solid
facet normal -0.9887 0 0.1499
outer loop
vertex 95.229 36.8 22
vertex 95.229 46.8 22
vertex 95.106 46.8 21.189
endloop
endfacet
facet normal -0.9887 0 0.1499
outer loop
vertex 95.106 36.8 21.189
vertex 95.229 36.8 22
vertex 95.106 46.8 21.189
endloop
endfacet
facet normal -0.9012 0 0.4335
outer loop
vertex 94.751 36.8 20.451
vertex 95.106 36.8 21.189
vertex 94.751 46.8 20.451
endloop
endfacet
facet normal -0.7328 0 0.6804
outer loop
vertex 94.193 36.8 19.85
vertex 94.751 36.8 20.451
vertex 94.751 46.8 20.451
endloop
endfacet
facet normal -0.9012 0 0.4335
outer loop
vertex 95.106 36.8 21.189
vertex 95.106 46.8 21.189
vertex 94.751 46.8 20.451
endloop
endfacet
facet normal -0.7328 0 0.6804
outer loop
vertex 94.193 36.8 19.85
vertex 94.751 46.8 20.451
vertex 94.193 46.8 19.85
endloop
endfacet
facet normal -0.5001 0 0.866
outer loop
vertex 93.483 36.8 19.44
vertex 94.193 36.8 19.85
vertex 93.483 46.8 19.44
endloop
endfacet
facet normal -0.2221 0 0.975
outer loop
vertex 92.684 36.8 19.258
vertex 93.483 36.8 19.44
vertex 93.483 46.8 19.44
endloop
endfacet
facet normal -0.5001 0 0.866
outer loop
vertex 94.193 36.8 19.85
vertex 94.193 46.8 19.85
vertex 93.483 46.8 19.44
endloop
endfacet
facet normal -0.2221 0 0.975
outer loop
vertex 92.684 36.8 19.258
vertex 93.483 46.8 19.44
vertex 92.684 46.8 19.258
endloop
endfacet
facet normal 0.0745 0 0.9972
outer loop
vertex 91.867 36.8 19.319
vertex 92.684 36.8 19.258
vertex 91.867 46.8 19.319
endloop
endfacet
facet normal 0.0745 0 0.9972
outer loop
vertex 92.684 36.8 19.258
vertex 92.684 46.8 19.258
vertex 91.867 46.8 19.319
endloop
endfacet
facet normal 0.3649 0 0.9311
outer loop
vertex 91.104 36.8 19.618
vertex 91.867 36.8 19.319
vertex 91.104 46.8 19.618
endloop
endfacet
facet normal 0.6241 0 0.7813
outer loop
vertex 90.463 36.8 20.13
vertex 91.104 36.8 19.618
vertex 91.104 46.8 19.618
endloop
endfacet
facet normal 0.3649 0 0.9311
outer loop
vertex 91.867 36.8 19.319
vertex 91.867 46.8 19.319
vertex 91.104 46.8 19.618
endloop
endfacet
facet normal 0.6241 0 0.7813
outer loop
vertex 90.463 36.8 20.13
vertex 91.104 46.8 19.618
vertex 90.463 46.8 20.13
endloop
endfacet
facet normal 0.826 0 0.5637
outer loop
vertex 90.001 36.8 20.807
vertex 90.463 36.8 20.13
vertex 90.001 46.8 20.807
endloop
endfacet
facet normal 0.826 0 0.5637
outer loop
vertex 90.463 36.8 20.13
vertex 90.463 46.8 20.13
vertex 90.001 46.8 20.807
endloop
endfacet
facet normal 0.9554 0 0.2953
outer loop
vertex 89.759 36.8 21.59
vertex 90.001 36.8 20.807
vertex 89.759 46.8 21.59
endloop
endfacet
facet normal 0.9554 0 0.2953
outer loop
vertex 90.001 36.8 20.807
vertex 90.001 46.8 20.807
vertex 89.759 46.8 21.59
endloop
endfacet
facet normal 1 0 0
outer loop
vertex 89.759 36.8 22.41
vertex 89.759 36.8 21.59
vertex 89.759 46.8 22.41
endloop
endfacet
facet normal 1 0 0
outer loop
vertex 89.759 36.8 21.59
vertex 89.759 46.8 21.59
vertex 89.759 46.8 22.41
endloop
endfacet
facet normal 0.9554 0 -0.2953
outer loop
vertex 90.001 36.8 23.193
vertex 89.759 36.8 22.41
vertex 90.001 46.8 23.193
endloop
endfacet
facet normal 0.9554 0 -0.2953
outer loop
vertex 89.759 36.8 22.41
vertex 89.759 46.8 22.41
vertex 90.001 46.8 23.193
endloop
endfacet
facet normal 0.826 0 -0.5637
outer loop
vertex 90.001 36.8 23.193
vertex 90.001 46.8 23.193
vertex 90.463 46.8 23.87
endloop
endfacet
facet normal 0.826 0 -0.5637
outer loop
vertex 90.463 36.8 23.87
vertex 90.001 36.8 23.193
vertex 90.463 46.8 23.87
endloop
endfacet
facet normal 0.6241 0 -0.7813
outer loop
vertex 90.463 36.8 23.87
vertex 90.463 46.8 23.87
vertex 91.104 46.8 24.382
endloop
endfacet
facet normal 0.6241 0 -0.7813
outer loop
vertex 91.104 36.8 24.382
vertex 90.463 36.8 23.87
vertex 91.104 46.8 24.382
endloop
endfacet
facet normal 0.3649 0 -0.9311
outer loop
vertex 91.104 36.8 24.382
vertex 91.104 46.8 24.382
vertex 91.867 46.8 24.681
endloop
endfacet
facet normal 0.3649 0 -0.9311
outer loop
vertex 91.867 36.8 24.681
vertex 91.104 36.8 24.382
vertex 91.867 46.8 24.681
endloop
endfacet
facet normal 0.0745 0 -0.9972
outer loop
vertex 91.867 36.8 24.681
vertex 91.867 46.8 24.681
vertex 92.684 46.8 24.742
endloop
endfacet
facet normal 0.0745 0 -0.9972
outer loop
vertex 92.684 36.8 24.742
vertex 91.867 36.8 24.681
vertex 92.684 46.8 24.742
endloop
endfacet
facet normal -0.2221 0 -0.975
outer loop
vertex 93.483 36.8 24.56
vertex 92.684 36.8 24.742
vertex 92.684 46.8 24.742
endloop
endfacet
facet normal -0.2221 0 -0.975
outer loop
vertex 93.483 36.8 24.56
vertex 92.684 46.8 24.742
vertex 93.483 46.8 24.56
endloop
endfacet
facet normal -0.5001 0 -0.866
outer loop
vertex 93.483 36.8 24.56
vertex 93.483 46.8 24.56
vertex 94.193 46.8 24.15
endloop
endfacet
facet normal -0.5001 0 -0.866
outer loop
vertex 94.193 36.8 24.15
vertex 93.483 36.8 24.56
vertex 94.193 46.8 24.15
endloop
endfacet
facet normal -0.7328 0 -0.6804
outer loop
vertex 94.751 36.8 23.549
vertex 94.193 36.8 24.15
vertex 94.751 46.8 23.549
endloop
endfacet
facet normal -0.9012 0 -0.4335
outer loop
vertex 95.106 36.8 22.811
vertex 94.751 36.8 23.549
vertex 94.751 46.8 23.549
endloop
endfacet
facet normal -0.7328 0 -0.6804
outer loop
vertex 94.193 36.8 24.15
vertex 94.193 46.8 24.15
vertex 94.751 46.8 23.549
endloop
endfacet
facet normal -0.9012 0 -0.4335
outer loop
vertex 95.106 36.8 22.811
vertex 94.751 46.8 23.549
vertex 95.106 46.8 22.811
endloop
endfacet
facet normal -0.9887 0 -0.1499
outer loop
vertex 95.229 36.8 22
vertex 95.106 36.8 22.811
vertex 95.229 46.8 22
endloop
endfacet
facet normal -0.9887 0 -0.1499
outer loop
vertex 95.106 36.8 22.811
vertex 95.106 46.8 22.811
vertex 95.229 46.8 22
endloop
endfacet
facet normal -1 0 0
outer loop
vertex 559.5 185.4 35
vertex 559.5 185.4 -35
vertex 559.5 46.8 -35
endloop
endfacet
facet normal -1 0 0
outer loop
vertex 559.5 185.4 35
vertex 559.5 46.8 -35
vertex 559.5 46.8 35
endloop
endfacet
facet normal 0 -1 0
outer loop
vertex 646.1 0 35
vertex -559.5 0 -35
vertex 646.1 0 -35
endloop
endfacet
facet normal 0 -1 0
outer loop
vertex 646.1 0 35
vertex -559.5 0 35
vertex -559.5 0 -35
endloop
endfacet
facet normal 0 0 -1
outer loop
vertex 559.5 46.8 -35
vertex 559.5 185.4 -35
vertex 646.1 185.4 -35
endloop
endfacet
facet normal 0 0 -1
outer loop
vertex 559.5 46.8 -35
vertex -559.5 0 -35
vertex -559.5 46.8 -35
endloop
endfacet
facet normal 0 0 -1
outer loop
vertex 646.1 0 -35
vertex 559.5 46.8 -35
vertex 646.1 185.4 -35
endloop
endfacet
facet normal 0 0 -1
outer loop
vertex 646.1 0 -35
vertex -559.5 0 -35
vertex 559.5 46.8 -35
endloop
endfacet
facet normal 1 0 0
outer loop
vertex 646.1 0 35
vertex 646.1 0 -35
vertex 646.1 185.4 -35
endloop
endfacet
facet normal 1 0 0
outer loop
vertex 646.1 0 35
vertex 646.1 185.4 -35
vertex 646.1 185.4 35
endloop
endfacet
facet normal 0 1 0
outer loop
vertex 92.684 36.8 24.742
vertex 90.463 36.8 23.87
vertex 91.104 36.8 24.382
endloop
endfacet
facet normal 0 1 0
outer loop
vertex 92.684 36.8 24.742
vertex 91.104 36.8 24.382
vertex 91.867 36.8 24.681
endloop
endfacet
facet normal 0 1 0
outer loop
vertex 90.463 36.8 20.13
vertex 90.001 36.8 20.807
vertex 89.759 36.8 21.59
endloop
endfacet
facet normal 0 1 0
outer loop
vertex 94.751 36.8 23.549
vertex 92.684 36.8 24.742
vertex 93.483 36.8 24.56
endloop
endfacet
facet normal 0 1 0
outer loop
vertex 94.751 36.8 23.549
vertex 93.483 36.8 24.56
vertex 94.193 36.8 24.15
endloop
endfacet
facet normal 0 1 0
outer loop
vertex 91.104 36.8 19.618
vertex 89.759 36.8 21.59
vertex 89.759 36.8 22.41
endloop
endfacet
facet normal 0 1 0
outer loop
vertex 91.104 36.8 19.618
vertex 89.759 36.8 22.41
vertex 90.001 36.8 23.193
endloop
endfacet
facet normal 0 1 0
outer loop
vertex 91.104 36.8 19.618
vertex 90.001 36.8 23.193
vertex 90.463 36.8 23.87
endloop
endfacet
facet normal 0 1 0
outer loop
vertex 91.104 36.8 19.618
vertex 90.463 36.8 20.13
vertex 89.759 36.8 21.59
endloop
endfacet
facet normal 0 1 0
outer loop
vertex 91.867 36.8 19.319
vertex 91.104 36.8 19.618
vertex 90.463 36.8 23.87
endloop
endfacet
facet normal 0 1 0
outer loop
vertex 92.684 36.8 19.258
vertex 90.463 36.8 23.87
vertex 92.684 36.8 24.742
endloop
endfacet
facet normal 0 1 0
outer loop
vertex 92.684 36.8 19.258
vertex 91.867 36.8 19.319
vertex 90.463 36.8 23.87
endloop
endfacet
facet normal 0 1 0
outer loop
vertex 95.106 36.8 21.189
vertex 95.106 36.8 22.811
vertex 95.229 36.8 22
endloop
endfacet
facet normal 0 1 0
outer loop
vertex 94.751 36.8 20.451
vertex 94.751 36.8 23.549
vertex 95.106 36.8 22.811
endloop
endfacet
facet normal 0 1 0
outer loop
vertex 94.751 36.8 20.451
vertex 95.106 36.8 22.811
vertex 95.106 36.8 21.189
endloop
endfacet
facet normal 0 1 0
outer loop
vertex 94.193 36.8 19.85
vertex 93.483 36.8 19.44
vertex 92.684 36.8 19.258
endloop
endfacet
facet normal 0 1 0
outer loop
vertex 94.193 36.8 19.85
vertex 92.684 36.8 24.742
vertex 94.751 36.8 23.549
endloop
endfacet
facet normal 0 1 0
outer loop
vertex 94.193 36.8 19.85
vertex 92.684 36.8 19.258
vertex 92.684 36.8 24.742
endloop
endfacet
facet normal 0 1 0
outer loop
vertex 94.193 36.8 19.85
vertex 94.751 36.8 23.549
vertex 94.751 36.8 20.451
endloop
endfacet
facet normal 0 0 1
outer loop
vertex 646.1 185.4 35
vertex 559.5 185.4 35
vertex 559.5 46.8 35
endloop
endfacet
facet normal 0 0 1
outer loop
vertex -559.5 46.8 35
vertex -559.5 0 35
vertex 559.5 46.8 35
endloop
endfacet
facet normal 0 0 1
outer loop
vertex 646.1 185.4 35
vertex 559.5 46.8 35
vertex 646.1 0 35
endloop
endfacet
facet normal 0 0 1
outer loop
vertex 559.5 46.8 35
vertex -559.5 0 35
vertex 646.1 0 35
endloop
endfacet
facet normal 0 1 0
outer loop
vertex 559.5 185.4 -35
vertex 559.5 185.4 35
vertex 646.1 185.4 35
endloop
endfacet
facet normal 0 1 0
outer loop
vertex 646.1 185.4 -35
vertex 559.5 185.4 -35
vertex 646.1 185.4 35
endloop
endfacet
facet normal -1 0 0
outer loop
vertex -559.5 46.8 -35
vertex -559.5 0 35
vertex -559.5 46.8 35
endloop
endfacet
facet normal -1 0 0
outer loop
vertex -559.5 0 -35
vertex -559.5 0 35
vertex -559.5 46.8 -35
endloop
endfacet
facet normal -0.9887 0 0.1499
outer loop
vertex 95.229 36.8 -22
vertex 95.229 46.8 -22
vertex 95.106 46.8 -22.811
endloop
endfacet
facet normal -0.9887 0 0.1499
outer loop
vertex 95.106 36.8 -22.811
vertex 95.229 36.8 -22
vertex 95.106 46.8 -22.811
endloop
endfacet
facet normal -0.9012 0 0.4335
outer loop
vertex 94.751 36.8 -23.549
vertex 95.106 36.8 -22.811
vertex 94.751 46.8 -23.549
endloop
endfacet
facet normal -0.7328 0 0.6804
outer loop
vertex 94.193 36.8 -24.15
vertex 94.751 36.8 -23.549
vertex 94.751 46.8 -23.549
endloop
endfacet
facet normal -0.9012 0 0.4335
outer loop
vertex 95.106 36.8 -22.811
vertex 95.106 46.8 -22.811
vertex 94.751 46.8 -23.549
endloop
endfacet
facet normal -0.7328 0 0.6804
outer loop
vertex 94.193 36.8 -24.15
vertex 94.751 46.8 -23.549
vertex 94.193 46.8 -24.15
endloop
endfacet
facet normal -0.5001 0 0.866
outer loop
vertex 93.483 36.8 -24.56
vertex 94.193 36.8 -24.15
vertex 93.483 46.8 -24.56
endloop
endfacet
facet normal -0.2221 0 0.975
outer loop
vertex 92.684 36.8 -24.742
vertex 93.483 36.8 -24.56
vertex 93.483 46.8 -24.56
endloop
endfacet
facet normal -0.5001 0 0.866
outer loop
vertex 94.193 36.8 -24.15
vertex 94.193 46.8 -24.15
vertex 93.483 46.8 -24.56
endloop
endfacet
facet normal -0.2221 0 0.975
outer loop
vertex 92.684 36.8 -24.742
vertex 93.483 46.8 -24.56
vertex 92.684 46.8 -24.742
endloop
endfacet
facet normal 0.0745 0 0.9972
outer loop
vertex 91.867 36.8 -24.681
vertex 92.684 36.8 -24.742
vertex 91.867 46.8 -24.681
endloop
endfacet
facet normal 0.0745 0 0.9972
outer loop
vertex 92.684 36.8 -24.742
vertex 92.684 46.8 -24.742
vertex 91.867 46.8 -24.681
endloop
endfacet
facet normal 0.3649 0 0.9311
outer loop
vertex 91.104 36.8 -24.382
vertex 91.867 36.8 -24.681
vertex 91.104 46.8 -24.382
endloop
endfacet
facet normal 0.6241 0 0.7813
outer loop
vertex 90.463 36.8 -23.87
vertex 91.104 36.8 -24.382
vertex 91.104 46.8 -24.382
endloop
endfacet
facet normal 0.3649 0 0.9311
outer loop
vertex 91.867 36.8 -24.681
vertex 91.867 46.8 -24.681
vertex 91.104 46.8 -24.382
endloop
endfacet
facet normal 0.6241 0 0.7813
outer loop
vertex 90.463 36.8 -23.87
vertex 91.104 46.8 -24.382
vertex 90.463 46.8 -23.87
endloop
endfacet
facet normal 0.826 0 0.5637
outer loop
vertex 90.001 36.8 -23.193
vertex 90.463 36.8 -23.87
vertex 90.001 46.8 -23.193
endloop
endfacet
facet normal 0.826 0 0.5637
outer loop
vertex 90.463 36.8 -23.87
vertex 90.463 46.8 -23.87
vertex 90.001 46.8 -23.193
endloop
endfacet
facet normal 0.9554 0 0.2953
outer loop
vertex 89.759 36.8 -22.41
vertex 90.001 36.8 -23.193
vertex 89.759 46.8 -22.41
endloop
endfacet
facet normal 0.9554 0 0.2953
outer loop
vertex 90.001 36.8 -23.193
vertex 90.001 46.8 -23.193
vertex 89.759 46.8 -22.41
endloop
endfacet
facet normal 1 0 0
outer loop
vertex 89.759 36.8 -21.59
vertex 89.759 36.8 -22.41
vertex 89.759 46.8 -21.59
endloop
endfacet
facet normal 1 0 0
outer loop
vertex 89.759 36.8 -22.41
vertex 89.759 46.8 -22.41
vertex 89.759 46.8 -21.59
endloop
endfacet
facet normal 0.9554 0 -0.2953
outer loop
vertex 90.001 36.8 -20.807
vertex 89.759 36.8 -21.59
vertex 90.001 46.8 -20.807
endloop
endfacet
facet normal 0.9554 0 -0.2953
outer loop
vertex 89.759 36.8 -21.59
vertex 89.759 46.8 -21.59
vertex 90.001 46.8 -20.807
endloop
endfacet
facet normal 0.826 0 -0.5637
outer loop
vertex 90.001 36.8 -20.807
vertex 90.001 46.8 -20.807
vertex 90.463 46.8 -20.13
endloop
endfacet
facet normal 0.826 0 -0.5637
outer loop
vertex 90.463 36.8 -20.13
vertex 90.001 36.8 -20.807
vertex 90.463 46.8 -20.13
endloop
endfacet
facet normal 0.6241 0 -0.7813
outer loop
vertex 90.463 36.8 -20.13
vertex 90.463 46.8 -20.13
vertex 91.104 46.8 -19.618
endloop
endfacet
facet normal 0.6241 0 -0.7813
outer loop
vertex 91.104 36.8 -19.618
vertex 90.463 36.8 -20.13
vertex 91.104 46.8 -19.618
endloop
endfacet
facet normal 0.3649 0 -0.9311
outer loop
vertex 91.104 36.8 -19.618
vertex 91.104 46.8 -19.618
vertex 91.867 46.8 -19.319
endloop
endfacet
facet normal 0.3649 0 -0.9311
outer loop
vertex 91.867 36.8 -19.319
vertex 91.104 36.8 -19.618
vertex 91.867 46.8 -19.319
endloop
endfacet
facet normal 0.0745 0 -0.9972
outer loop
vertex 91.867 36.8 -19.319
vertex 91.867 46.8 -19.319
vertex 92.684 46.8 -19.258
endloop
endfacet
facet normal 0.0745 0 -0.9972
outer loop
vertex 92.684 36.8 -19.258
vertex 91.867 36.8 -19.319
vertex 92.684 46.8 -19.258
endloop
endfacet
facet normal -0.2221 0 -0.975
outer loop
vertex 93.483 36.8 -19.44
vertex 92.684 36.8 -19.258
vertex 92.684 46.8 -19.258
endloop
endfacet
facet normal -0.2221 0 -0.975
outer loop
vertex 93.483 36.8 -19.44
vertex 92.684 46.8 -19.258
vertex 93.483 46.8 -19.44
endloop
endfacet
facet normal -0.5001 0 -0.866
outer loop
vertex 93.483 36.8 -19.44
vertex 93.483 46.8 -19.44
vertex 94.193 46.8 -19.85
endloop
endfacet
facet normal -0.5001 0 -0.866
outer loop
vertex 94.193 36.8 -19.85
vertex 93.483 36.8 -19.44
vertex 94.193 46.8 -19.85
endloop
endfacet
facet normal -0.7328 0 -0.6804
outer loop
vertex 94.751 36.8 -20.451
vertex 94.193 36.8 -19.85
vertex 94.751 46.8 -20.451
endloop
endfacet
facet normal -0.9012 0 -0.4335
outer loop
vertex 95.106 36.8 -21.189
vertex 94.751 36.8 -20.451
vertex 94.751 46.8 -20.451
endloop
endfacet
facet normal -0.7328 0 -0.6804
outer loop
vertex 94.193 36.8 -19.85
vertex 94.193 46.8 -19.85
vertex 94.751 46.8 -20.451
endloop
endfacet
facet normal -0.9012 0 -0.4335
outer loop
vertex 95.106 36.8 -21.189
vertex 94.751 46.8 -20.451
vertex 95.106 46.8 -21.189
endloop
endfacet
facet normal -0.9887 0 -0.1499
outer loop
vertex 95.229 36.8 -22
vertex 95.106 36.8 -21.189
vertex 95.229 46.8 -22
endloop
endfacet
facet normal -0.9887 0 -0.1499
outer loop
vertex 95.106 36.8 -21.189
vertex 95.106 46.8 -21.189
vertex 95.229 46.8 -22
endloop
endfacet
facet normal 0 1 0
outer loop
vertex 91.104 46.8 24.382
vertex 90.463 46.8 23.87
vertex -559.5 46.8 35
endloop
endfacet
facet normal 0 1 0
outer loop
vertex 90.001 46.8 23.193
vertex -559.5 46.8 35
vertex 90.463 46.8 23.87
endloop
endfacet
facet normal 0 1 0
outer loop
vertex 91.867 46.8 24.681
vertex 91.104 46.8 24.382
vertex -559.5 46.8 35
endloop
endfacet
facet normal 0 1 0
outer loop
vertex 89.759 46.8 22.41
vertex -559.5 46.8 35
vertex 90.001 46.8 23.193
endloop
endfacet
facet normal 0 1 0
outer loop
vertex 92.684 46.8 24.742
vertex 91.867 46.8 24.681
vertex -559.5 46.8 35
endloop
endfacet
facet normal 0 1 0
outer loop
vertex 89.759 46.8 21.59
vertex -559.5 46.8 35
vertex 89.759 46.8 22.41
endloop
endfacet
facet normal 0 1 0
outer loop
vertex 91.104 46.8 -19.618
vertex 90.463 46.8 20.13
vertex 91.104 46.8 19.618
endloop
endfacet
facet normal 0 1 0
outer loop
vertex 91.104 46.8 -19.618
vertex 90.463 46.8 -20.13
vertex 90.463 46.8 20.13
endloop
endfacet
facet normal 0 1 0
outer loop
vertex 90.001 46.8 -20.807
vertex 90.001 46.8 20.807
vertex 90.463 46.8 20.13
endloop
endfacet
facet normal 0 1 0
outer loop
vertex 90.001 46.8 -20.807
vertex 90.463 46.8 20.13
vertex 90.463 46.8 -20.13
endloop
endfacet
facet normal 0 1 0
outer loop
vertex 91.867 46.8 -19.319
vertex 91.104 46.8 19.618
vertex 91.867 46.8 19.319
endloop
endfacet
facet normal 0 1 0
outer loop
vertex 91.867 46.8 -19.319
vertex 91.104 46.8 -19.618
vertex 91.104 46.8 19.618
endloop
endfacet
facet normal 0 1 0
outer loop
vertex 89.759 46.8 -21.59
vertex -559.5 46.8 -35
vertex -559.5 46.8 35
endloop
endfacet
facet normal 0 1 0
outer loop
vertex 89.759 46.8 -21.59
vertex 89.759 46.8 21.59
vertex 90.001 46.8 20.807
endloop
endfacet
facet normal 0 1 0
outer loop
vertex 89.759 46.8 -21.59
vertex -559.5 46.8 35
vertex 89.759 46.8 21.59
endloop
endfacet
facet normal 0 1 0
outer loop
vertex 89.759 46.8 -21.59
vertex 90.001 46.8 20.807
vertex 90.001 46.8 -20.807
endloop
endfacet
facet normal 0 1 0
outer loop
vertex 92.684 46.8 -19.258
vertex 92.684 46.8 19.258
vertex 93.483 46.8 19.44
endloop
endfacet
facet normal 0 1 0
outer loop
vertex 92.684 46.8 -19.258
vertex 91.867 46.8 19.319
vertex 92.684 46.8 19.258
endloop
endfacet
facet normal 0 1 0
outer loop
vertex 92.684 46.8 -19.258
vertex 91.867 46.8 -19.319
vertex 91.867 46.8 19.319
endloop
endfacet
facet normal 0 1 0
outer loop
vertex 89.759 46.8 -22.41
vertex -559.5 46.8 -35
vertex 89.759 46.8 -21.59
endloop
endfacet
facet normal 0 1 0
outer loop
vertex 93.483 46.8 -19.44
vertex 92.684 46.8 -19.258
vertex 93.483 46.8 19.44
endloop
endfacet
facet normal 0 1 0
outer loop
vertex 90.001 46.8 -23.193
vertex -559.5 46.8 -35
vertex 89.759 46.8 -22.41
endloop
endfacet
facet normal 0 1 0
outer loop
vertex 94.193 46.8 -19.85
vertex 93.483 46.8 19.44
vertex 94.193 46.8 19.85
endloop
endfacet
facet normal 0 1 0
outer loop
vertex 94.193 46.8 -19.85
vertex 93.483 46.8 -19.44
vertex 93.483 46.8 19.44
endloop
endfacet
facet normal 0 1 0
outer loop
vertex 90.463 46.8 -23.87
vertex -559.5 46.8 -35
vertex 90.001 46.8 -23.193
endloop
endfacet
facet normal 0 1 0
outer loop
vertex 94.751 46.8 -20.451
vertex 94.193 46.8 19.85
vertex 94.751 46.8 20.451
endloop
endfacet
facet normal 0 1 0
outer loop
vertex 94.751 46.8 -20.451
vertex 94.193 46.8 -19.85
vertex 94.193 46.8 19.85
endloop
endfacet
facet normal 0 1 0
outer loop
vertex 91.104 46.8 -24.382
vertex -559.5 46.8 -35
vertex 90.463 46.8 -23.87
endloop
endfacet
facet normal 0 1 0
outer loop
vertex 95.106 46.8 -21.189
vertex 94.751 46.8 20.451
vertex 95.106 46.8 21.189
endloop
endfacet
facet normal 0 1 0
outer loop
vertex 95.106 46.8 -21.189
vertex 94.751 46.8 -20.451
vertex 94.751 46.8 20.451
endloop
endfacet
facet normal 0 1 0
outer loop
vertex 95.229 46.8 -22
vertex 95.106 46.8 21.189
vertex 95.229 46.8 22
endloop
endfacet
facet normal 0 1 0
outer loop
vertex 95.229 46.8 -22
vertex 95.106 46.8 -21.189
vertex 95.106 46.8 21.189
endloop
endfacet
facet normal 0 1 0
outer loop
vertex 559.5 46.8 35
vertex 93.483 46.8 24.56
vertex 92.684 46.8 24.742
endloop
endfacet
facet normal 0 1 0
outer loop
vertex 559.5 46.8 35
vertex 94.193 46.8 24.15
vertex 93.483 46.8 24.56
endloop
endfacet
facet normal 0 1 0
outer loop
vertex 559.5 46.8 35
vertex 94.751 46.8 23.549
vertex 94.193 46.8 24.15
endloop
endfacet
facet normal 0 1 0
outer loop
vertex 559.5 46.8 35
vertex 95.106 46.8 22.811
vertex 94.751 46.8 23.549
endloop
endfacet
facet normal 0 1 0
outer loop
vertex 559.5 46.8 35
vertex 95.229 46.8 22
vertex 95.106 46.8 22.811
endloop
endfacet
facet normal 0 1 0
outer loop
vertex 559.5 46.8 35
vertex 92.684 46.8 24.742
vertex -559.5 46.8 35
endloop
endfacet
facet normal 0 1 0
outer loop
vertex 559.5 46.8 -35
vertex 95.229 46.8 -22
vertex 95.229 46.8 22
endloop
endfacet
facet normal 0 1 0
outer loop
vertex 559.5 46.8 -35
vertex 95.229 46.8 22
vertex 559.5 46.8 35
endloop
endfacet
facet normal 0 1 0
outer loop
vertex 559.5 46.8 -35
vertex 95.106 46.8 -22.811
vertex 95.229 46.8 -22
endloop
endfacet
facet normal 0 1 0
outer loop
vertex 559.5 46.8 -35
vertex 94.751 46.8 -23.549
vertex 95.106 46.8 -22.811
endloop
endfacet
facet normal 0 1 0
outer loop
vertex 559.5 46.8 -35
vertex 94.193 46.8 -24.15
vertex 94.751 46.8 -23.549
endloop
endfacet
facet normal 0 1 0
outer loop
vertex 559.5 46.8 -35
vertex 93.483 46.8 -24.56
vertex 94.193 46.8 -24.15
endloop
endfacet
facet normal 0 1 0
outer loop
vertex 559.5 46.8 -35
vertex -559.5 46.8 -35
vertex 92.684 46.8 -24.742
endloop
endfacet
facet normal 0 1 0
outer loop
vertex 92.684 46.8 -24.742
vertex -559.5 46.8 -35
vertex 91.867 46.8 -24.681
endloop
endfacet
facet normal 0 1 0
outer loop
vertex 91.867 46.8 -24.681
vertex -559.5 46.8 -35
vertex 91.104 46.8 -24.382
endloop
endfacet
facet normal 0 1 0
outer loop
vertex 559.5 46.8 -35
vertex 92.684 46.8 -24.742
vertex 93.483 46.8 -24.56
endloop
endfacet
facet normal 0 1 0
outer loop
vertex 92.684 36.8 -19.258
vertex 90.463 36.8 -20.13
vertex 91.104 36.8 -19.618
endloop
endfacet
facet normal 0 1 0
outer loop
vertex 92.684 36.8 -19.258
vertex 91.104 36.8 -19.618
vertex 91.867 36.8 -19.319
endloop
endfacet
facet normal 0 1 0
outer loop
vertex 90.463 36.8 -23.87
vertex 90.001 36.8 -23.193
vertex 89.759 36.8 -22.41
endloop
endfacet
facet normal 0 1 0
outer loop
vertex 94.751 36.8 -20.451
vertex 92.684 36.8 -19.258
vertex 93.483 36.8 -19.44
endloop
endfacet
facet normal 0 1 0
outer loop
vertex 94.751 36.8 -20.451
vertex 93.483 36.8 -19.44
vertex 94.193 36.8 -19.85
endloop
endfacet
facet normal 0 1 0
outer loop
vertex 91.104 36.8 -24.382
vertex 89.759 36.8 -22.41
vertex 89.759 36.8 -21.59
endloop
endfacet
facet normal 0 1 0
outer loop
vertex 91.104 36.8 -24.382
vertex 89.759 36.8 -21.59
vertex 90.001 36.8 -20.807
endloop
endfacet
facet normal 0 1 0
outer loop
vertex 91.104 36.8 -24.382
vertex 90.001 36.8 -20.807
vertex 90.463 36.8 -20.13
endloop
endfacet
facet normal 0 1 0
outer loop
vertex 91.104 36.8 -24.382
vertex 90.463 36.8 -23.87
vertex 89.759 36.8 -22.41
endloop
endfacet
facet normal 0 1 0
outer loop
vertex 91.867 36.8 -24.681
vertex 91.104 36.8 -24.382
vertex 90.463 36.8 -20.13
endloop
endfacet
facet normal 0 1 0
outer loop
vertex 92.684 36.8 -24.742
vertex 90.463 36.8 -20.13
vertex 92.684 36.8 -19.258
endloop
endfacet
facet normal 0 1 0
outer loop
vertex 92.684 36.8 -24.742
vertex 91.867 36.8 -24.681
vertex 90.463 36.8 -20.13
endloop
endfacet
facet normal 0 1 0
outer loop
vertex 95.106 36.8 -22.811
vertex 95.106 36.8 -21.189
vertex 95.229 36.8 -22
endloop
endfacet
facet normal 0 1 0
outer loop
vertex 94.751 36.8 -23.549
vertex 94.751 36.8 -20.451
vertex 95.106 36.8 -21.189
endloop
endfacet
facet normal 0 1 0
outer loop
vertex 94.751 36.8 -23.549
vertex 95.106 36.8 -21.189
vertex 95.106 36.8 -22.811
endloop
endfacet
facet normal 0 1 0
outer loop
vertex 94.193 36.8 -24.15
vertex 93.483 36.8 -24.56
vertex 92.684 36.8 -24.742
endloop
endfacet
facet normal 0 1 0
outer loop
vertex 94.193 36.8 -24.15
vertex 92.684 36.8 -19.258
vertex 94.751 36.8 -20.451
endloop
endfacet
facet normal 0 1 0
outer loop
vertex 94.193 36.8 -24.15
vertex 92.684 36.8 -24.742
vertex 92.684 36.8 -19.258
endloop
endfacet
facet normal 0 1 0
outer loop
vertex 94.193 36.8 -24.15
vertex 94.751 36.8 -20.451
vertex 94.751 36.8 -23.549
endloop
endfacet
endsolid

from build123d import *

# Parameters (mm, degrees)
SKETCH1_W           = 1119
SKETCH1_H           = 70
BOSS_EXTRUDE1_DEPTH = 46.8
SKETCH2_W           = 86.6
SKETCH2_H           = 70
BOSS_EXTRUDE2_DEPTH = 185.4
SKETCH4_R           = 2.75
CUT_EXTRUDE1_DEPTH  = 10


with BuildPart() as part:
    # Sketch1 → Boss-Extrude1 (new body)
    with BuildSketch(Plane(origin=(0, 0, 0), x_dir=(1, 0, 0), z_dir=(0, 1, 0))):
        Rectangle(SKETCH1_W, SKETCH1_H)
    extrude(amount=BOSS_EXTRUDE1_DEPTH)

    # Sketch2 → Boss-Extrude2 (add)
    with BuildSketch(Plane.XZ):
        with Locations((602.8, 0)):
            Rectangle(SKETCH2_W, SKETCH2_H)
    extrude(amount=-BOSS_EXTRUDE2_DEPTH)

    # Sketch4 → Cut-Extrude1 (cut)
    with BuildSketch(Plane(origin=(0, 46.8, 0), x_dir=(1, 0, 0), z_dir=(0, 1, 0))):
        with Locations((92.478641365, 22)):
            Circle(SKETCH4_R)
        with Locations((92.478641365, -22)):
            Circle(SKETCH4_R)
    extrude(amount=-CUT_EXTRUDE1_DEPTH, mode=Mode.SUBTRACT)


solid = part.part
